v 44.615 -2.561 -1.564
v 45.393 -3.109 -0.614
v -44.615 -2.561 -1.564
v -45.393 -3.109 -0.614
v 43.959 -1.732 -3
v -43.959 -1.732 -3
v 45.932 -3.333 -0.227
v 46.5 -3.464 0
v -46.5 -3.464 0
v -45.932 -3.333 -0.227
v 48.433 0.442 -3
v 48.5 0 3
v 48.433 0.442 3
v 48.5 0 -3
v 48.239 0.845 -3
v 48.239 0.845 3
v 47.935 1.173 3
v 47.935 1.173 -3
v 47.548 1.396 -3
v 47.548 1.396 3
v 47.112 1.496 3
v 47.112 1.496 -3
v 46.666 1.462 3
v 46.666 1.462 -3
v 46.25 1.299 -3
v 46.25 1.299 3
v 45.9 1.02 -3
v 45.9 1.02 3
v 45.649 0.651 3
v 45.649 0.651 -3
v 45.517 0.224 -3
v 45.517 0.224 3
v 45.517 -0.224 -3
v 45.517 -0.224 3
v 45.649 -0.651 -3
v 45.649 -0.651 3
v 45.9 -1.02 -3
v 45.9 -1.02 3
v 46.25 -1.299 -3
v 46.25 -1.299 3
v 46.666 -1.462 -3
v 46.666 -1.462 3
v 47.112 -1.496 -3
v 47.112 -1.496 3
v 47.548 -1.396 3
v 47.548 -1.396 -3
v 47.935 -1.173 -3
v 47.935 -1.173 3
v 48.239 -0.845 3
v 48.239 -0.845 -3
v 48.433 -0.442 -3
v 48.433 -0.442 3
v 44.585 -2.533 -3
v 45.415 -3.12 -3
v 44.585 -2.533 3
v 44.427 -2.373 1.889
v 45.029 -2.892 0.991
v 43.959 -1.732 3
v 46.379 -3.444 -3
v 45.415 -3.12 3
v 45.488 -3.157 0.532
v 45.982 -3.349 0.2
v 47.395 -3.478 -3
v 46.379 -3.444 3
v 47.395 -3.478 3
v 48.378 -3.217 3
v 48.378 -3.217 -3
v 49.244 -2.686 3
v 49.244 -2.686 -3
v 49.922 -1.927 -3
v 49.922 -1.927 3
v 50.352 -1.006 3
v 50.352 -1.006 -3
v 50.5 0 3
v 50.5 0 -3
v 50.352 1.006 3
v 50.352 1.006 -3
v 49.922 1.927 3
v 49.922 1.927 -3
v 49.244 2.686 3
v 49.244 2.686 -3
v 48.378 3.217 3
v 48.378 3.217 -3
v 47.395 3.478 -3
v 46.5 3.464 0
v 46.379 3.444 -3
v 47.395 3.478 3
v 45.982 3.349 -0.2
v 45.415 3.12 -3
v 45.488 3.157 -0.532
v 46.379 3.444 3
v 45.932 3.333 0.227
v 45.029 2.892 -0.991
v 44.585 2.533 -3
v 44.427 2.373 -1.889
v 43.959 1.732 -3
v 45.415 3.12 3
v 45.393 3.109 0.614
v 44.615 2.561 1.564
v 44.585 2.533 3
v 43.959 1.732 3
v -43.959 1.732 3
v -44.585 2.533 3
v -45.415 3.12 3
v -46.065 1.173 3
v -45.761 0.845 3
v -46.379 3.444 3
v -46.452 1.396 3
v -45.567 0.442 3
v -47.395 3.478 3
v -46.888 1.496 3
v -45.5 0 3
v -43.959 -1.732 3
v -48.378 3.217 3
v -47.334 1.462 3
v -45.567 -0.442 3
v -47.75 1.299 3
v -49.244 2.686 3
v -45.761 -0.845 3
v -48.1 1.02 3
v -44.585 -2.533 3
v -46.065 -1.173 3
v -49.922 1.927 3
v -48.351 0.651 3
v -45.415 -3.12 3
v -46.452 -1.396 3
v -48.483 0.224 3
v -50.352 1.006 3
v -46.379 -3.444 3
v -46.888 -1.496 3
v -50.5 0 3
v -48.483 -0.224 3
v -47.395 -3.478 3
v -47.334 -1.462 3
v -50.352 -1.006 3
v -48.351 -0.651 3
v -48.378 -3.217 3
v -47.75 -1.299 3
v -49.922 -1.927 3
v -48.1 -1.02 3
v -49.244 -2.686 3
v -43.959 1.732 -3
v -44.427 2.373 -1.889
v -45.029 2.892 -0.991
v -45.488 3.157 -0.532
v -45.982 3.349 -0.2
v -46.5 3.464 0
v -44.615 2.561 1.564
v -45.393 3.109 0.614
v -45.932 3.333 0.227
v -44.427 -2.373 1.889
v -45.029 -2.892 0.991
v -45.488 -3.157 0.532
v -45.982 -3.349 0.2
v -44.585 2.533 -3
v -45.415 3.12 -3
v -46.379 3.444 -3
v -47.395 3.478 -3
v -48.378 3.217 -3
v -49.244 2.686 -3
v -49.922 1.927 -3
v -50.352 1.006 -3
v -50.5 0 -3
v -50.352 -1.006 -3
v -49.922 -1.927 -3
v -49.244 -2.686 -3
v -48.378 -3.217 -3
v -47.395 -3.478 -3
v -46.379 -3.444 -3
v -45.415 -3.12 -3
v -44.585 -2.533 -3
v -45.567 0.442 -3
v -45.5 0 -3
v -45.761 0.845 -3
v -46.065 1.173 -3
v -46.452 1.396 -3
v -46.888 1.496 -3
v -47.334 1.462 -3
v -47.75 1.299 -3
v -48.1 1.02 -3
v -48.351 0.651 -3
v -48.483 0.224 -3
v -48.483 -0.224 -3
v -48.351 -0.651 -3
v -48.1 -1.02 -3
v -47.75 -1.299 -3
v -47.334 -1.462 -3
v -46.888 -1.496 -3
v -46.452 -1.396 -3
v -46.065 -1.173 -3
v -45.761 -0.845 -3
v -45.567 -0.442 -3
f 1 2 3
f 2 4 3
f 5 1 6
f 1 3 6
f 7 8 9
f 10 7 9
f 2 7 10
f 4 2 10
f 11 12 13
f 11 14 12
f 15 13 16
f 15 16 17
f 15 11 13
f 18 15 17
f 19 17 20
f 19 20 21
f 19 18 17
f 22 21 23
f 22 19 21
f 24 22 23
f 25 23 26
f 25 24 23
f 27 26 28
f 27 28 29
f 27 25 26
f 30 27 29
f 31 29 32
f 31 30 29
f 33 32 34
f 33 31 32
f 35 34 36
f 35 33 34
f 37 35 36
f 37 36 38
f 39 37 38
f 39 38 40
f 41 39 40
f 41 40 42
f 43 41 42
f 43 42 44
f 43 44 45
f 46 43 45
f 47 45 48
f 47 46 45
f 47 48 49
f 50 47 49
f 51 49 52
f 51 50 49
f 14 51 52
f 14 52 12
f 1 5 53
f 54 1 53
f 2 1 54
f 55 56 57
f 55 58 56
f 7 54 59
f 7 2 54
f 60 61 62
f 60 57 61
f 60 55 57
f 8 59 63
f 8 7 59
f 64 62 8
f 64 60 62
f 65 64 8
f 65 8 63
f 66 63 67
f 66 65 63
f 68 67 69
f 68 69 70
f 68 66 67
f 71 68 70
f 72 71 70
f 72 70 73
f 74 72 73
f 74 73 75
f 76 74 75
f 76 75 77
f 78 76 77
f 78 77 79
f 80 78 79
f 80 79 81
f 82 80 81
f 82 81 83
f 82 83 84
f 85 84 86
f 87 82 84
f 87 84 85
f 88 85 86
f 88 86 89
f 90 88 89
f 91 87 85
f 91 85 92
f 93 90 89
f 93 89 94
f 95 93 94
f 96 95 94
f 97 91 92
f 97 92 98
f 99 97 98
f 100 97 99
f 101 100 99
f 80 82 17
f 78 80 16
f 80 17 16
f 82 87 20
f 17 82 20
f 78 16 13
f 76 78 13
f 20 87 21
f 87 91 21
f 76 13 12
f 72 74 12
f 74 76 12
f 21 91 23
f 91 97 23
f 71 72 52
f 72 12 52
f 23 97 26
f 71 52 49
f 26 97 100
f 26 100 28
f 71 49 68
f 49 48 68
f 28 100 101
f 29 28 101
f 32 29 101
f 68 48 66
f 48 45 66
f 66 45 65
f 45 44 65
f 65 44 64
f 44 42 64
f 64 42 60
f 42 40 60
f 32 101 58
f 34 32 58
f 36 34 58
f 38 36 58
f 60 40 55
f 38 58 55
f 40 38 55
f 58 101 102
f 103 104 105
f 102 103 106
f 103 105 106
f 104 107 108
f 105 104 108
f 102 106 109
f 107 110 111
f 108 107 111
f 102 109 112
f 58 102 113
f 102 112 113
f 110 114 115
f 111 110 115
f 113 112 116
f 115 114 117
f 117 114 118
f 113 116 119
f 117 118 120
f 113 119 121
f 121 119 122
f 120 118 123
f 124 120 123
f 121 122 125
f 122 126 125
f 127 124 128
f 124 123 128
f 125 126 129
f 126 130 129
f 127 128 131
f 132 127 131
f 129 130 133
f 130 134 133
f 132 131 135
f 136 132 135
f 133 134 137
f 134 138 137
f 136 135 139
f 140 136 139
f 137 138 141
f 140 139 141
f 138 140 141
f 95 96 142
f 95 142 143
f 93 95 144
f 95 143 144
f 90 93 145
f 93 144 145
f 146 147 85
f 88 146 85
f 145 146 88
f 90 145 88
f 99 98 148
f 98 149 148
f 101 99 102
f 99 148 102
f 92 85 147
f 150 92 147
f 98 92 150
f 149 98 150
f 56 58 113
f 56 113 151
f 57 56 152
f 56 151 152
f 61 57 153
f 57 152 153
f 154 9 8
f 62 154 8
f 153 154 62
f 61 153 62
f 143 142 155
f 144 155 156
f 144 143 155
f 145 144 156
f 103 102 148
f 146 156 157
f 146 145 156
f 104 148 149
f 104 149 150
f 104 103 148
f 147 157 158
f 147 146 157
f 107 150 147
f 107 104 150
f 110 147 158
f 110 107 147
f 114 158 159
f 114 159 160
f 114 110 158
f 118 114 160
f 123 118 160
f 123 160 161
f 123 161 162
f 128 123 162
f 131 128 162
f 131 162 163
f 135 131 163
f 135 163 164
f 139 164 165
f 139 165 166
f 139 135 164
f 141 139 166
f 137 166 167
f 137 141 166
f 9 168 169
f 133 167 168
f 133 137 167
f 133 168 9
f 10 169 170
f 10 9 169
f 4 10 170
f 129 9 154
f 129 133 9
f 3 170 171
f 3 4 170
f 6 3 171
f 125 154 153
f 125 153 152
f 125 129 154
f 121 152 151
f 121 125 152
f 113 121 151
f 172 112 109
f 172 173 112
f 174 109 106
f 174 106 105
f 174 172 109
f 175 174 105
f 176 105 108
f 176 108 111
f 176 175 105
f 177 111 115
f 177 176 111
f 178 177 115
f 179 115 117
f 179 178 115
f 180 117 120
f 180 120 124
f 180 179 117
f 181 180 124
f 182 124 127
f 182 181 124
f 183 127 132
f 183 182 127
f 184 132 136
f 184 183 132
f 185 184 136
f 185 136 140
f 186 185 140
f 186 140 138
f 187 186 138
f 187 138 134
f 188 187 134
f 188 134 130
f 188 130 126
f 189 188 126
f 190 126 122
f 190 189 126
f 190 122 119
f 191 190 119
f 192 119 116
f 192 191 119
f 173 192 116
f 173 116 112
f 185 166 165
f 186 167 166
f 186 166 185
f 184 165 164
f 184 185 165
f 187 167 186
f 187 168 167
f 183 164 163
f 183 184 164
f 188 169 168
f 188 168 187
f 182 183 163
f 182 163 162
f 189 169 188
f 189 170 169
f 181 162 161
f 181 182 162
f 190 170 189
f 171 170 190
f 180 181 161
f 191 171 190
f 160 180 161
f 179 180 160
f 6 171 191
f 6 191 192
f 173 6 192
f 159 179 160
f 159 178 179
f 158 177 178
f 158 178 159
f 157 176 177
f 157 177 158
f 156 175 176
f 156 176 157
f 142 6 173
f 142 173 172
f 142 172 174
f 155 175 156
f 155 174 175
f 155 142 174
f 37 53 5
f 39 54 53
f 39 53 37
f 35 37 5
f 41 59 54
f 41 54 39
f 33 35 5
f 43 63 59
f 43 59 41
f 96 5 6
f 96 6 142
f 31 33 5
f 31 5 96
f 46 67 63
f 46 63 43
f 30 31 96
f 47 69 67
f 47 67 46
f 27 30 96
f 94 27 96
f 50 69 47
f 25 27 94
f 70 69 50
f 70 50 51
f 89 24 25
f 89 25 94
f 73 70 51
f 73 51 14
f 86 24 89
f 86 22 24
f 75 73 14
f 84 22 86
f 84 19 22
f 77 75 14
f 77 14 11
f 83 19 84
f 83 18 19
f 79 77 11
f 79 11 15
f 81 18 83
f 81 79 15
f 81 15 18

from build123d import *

# Parameters (mm, degrees)
SKETCH1_R                            = 3.5
SKETCH1_R_2                          = 1.5
BOSS_EXTRUDE1_DEPTH                  = 3
BOSS_EXTRUDE1_2_DEPTH                = 3
BOSS_EXTRUDE2_REACH                  = 52.71
BOSS_EXTRUDE2_END_RADIUS             = 3.5
BOSS_EXTRUDE2_DIRECTION_2_REACH      = 52.71
BOSS_EXTRUDE2_DIRECTION_2_END_RADIUS = 3.5


with BuildPart() as part:
    # Sketch1 → Boss-Extrude1 (new, symmetric)
    with BuildSketch(Plane.XY):
        with Locations((-47, 0)):
            Circle(SKETCH1_R)
        with Locations((-47, 0)):
            Circle(SKETCH1_R_2, mode=Mode.SUBTRACT)
    extrude(amount=BOSS_EXTRUDE1_DEPTH, both=True)



with BuildPart() as body_2:
    # Sketch1 → Boss-Extrude1 2 (new, symmetric)
    with BuildSketch(Plane.XY):
        with Locations((47, 0)):
            Circle(SKETCH1_R)
        with Locations((47, 0)):
            Circle(SKETCH1_R_2, mode=Mode.SUBTRACT)
    extrude(amount=BOSS_EXTRUDE1_2_DEPTH, both=True)


with BuildPart() as part_1:
    add(part.part)

    add(body_2.part)  # Boss-Extrude2 merges body 2
    # Boss-Extrude2: up to this cylinder (the profile starts outside it)
    boss_extrude2_end = Plane(origin=(-47, 0, 0), z_dir=(0, 0, -1)) * Cylinder(BOSS_EXTRUDE2_END_RADIUS, 113.42, mode=Mode.PRIVATE)
    # Sketch2 → Boss-Extrude2 (add, up to the surface)
    with BuildSketch(Plane(origin=(0, 0, 0), x_dir=(0, 0, -1), z_dir=(1, 0, 0)), mode=Mode.PRIVATE) as boss_extrude2_sk1:
        Polygon((-3, 1.732050808), (-3, -1.732050808), (0, -3.464101615), (3, -1.732050808), (3, 1.732050808), (0, 3.464101615), align=None)
    boss_extrude2_tool1 = extrude(boss_extrude2_sk1.sketch, amount=-BOSS_EXTRUDE2_REACH, mode=Mode.PRIVATE) - boss_extrude2_end
    add(boss_extrude2_tool1.solids().sort_by_distance((0, 0, 0))[0])

    # Boss-Extrude2 direction 2: up to this cylinder (the profile starts outside it)
    boss_extrude2_direction_2_end = Plane(origin=(47, 0, 0), z_dir=(0, 0, -1)) * Cylinder(BOSS_EXTRUDE2_DIRECTION_2_END_RADIUS, 113.42, mode=Mode.PRIVATE)
    # Sketch2 → Boss-Extrude2 direction 2 (add, up to the surface)
    with BuildSketch(Plane(origin=(0, 0, 0), x_dir=(0, 0, -1), z_dir=(1, 0, 0)), mode=Mode.PRIVATE) as boss_extrude2_direction_2_sk1:
        Polygon((-3, 1.732050808), (-3, -1.732050808), (0, -3.464101615), (3, -1.732050808), (3, 1.732050808), (0, 3.464101615), align=None)
    boss_extrude2_direction_2_tool1 = extrude(boss_extrude2_direction_2_sk1.sketch, amount=BOSS_EXTRUDE2_DIRECTION_2_REACH, mode=Mode.PRIVATE) - boss_extrude2_direction_2_end
    add(boss_extrude2_direction_2_tool1.solids().sort_by_distance((0, 0, 0))[0])


solid = part_1.part
